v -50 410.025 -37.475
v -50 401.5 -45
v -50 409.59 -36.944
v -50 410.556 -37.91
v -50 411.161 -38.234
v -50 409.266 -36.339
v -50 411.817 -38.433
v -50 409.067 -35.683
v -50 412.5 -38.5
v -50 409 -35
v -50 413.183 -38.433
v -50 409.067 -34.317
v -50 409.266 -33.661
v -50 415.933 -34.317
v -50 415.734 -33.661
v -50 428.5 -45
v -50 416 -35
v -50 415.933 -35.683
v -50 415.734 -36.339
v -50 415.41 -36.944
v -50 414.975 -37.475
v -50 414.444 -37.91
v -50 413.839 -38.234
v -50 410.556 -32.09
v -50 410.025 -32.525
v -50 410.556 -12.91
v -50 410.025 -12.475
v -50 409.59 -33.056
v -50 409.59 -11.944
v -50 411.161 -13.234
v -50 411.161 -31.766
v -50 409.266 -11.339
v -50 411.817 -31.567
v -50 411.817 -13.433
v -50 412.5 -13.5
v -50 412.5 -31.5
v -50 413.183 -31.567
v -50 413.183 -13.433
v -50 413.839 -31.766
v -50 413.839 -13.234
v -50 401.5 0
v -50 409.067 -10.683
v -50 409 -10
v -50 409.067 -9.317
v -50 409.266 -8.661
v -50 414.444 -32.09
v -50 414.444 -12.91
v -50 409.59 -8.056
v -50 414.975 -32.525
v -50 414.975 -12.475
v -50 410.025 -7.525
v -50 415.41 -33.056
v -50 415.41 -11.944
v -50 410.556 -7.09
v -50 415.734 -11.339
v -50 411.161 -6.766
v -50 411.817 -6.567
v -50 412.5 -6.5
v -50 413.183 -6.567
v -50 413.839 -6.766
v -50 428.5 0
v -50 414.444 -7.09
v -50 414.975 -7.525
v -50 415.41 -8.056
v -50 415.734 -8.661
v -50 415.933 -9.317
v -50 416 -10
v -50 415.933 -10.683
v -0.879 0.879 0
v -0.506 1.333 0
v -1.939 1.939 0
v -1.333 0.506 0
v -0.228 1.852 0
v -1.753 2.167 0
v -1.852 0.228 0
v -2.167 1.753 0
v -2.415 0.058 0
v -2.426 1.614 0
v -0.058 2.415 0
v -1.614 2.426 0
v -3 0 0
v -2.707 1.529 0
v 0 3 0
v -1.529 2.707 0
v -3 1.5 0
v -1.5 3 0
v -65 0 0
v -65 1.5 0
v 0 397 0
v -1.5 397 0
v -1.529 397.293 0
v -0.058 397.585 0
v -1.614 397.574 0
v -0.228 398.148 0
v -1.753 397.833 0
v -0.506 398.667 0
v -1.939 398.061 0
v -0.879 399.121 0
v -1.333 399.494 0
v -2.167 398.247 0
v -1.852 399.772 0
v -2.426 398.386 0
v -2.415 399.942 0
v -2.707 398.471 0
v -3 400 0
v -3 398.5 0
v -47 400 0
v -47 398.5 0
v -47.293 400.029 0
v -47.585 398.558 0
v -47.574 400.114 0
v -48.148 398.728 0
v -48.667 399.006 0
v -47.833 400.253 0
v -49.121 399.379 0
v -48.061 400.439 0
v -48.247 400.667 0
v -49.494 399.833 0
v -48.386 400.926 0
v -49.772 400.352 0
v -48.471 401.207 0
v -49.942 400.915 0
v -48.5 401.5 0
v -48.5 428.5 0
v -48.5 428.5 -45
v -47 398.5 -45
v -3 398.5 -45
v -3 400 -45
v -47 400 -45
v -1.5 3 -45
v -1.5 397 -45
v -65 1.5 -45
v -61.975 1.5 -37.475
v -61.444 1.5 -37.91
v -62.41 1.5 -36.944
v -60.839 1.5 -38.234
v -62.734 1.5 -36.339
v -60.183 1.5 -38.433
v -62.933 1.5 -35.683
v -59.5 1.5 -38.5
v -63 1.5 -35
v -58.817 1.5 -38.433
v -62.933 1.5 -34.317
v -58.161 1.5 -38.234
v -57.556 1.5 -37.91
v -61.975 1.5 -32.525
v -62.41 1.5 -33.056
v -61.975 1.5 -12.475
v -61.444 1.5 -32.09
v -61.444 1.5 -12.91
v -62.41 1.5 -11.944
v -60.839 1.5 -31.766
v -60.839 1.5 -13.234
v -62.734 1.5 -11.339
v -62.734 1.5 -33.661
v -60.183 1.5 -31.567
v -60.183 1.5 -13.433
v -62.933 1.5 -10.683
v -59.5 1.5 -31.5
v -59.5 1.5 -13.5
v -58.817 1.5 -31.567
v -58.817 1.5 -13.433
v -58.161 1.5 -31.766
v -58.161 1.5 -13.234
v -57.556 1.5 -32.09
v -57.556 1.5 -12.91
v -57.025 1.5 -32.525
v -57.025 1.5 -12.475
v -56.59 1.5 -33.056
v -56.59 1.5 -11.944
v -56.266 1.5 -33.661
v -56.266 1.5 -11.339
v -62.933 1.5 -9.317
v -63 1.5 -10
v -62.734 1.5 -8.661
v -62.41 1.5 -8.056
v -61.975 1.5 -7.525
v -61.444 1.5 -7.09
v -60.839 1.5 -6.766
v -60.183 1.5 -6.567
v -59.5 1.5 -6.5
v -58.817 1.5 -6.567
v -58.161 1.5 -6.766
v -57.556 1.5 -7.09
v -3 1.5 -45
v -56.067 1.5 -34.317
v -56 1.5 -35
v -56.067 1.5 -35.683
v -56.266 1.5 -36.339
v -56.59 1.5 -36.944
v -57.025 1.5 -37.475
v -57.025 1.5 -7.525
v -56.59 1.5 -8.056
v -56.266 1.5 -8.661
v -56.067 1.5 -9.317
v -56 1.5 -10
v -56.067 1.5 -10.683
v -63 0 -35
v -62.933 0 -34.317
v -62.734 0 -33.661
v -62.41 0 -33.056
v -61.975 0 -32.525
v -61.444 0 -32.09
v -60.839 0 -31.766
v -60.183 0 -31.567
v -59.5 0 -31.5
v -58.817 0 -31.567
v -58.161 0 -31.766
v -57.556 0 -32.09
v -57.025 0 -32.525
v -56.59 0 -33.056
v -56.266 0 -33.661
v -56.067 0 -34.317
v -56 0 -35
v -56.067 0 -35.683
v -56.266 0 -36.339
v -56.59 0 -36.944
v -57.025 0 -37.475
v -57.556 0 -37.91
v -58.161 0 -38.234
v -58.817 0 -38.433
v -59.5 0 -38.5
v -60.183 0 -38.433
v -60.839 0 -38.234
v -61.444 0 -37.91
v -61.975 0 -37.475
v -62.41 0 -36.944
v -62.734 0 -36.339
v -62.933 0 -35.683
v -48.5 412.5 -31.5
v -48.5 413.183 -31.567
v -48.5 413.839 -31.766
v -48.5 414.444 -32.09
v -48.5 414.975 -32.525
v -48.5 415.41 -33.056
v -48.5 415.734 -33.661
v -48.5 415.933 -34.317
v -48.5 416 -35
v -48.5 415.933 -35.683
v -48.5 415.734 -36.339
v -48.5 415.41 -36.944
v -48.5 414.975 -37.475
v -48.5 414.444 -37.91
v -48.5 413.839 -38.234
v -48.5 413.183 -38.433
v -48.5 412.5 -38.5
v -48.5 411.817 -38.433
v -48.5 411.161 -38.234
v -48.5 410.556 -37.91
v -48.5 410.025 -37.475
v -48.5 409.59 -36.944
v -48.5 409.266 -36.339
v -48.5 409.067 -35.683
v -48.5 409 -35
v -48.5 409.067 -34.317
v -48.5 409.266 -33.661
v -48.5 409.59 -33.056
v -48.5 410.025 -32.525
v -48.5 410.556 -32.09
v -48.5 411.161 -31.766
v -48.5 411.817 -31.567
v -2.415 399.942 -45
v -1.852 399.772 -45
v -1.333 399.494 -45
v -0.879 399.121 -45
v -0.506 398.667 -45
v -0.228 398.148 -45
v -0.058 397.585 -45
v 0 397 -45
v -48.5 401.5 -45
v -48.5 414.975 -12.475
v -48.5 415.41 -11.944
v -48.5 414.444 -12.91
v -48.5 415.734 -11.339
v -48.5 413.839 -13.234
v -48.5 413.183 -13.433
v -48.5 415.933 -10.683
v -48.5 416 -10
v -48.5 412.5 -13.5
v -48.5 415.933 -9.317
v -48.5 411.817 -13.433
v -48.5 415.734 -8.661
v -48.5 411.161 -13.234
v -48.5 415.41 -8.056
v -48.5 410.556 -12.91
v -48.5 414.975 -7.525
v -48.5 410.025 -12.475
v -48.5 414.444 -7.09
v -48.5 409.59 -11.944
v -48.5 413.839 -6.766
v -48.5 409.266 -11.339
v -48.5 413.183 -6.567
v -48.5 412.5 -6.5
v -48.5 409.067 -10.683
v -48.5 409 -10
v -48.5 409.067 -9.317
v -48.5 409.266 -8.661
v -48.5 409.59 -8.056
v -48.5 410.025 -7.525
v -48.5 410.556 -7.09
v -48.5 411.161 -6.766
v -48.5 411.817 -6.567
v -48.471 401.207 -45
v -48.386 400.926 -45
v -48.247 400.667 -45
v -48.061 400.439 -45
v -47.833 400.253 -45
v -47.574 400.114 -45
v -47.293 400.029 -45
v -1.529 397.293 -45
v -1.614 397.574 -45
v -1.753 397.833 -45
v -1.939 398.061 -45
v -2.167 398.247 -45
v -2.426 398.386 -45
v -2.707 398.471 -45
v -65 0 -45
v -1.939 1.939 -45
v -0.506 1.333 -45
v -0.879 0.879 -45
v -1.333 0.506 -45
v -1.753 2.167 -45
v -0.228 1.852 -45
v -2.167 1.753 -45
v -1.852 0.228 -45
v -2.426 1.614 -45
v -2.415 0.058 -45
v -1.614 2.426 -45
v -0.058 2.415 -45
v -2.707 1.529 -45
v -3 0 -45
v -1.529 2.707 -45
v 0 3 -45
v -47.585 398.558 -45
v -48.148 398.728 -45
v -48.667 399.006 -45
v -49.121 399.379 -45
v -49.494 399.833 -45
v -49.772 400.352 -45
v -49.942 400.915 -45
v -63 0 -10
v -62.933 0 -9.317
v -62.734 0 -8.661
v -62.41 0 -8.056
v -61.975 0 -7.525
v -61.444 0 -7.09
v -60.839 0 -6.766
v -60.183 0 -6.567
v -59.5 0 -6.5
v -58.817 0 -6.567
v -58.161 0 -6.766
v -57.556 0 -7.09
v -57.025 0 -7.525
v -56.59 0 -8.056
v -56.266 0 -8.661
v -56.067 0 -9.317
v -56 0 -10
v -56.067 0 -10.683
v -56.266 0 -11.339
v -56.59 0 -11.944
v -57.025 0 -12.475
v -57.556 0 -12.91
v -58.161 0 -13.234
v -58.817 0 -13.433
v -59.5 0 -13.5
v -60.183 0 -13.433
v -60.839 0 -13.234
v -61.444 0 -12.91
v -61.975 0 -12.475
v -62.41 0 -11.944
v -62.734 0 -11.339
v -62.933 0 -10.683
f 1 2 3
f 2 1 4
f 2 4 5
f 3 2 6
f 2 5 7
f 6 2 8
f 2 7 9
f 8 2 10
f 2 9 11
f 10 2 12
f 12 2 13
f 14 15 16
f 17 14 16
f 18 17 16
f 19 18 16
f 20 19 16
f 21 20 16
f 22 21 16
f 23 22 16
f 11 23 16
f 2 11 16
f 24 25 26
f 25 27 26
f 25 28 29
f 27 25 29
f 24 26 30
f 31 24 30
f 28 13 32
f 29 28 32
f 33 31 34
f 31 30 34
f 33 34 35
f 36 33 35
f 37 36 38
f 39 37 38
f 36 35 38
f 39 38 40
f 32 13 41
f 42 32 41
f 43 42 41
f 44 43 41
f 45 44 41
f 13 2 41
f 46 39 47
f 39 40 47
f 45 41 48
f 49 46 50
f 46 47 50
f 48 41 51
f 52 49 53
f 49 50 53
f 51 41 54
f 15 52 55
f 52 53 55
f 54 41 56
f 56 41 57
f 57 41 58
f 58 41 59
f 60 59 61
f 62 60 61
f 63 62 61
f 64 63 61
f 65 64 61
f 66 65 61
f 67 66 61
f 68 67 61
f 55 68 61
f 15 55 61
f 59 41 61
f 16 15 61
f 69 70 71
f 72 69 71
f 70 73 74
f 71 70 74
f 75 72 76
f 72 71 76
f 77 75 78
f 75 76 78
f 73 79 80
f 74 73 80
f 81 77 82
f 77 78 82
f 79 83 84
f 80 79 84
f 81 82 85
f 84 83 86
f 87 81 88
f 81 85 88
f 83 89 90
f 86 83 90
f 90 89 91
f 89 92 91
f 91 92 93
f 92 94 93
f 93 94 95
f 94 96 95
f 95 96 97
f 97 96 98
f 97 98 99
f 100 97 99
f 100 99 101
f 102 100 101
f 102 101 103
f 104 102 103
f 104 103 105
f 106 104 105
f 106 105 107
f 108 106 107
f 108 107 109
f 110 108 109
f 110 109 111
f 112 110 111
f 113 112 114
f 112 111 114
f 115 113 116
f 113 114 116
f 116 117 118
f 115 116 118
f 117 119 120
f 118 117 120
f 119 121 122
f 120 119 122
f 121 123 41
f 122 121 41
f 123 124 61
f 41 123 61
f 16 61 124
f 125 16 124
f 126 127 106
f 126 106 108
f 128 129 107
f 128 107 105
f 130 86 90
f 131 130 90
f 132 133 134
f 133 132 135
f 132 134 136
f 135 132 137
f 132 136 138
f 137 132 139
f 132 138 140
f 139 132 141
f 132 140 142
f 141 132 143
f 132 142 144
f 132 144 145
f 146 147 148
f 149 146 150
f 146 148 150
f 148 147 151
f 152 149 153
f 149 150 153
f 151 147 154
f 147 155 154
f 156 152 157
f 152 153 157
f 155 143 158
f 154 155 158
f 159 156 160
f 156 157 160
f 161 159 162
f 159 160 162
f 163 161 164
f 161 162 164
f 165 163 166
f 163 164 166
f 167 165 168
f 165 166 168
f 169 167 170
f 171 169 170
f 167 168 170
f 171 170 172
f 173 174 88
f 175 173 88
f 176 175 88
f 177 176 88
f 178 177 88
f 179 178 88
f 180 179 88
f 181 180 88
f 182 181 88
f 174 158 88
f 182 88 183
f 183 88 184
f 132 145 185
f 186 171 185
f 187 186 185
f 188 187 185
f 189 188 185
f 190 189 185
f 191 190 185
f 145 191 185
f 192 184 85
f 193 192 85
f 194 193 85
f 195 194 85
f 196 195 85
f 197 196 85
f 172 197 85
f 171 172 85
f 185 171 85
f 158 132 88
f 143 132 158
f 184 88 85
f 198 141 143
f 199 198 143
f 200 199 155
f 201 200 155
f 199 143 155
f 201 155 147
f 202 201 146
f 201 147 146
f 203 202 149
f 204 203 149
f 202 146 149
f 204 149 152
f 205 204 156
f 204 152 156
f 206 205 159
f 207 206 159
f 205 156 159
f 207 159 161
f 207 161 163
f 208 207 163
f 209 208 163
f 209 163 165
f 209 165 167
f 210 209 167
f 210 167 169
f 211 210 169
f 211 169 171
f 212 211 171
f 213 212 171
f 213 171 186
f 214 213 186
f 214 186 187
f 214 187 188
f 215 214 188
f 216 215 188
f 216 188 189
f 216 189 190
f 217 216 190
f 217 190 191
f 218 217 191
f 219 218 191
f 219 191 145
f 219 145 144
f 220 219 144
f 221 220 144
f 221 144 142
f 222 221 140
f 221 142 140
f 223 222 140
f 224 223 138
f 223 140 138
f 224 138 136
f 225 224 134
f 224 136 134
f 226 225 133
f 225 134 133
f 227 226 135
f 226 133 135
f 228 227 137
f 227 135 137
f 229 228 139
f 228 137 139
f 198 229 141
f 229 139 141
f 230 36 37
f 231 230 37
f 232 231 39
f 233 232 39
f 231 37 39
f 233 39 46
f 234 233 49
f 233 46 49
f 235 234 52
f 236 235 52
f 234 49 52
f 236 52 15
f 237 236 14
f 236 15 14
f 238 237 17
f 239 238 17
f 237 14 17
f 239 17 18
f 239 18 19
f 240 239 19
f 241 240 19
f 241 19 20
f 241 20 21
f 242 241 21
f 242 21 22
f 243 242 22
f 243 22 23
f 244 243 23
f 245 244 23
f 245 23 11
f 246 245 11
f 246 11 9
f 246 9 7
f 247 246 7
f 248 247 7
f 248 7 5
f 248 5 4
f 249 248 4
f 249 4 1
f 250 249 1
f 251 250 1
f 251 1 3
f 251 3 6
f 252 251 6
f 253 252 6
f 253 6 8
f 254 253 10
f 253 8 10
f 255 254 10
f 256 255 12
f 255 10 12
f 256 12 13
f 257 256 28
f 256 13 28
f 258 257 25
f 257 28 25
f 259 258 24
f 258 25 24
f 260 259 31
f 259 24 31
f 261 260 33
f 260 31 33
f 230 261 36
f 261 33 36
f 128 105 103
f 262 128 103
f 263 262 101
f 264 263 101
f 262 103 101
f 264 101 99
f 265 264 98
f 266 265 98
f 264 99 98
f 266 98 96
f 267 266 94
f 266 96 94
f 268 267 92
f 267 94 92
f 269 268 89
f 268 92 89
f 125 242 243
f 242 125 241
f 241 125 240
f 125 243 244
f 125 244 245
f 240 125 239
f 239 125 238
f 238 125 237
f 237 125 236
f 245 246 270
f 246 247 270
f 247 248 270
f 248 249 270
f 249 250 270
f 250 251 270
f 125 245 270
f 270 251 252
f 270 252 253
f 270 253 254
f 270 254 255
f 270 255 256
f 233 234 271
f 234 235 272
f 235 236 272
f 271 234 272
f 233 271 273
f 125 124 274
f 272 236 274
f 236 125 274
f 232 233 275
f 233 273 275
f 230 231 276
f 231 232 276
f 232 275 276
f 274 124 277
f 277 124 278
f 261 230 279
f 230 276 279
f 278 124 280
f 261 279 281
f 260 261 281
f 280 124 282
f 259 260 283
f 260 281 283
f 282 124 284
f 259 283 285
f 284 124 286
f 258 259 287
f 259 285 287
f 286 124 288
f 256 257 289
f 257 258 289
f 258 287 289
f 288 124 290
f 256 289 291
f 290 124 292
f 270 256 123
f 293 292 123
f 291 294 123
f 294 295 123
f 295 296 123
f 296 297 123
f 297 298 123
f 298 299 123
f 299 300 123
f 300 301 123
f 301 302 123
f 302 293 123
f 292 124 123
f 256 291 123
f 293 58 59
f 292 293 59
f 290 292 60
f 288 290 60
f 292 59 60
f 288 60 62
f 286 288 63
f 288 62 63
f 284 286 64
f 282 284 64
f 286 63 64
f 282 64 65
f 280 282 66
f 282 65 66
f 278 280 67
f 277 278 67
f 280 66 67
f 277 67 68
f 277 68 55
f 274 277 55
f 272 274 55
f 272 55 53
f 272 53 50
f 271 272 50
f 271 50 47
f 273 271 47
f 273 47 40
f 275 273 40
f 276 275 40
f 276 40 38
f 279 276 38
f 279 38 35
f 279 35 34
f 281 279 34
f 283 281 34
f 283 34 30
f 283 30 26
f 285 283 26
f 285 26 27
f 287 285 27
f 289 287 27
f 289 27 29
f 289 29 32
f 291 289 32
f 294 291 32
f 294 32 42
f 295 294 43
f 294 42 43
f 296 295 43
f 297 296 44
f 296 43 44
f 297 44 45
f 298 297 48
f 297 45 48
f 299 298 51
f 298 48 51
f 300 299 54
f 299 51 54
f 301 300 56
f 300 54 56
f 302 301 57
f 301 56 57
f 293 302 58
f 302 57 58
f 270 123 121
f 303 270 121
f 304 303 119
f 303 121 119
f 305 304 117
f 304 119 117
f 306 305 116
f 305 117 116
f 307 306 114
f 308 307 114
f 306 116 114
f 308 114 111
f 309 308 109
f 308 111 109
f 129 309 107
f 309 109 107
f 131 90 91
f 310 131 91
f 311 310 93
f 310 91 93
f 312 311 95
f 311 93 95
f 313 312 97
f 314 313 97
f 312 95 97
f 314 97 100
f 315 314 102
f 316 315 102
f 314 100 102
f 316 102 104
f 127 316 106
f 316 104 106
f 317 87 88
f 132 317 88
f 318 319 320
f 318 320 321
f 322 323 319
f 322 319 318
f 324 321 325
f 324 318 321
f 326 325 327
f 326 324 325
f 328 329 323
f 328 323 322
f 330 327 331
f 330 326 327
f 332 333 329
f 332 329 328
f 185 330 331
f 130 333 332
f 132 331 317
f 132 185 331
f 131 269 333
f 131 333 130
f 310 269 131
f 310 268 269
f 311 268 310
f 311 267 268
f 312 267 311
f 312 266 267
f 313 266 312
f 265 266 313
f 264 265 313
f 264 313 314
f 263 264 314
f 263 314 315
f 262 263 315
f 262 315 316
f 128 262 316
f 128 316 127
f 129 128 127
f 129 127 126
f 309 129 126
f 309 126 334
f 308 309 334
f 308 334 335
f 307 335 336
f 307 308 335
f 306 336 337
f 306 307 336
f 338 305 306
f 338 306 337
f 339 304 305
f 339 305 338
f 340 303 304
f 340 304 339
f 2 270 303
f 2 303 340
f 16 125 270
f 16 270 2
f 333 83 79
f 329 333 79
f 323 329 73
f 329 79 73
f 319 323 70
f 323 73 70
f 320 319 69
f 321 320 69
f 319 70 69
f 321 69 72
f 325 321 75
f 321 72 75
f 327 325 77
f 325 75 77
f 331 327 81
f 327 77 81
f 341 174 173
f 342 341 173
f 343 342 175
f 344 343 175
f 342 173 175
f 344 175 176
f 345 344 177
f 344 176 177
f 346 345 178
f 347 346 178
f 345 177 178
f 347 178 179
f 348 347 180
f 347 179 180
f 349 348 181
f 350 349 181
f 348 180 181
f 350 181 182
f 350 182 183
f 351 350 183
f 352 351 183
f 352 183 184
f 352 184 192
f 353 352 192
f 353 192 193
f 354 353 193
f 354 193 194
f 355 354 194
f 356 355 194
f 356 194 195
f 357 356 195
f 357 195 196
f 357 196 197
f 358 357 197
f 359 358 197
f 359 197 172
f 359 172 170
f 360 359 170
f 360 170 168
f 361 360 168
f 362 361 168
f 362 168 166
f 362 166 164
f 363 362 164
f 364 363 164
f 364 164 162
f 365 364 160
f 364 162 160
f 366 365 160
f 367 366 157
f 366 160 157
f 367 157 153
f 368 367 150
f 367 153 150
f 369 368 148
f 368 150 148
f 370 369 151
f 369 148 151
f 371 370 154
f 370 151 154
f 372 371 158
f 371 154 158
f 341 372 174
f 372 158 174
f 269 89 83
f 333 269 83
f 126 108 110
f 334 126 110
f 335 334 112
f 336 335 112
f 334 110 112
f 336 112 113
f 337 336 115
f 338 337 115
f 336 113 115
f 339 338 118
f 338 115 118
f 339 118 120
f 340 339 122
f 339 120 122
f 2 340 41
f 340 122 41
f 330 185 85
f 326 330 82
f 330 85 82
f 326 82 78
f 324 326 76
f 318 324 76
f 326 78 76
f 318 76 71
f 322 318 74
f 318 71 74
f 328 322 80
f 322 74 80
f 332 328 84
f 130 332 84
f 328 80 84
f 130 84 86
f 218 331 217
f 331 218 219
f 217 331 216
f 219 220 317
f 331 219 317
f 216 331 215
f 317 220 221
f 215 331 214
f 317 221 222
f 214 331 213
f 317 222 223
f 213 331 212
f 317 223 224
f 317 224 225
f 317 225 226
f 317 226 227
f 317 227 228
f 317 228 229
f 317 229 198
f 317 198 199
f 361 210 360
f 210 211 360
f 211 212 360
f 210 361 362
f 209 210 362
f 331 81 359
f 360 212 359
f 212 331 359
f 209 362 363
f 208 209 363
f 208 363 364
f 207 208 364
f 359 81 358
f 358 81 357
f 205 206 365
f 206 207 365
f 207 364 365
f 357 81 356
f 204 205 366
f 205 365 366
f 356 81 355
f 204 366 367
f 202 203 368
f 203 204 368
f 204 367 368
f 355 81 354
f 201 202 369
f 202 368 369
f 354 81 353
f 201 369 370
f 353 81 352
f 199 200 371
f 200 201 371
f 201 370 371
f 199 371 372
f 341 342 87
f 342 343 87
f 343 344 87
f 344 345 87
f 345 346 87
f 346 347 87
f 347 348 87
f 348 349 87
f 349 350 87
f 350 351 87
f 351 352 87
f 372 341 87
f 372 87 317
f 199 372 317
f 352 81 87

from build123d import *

# Parameters (mm, degrees)
SM_BASE_FLANGE_1_DEPTH = 45
SKETCH_6_R             = 3.5
CUT_EXTRUDE_1_DEPTH    = 10
SKETCH_7_R             = 3.5
CUT_EXTRUDE_2_DEPTH    = 10


# Sheet-metal steps are written as plain solids
with BuildPart() as part:
    # Sketch 1 → Базовая кромка1 (new body)
    with BuildSketch(Plane.XY):
        with BuildLine():
            Line((-48.5, 428.5), (-48.5, 401.5))
            ThreePointArc((-48.5, 401.5), (-48.060660172, 400.439339828), (-47, 400))
            Line((-47, 400), (-3, 400))
            ThreePointArc((-3, 400), (-0.878679656, 399.121320344), (0, 397))
            Line((0, 397), (0, 3))
            ThreePointArc((0, 3), (-0.878679656, 0.878679656), (-3, 0))
            Line((-3, 0), (-65, 0))
            Line((-65, 0), (-65, 1.5))
            Line((-65, 1.5), (-3, 1.5))
            ThreePointArc((-3, 1.5), (-1.939339828, 1.939339828), (-1.5, 3))
            Line((-1.5, 3), (-1.5, 397))
            ThreePointArc((-1.5, 397), (-1.939339828, 398.060660172), (-3, 398.5))
            Line((-3, 398.5), (-47, 398.5))
            ThreePointArc((-47, 398.5), (-49.121320344, 399.378679656), (-50, 401.5))
            Line((-50, 401.5), (-50, 428.5))
            Line((-50, 428.5), (-48.5, 428.5))
        make_face()
    extrude(amount=-SM_BASE_FLANGE_1_DEPTH)

    # Эскиз6 → Вырез-Вытянуть1 (cut)
    with BuildSketch(Plane(origin=(0, 1.5, 0), x_dir=(1, 0, 0), z_dir=(0, 1, 0))):
        with Locations(Location((-59.5, 35, 0), (0, 0, 180))):
            Circle(SKETCH_6_R)
        with Locations(Location((-59.5, 10, 0), (0, 0, 180))):
            Circle(SKETCH_6_R)
    extrude(amount=-CUT_EXTRUDE_1_DEPTH, mode=Mode.SUBTRACT)

    # Эскиз7 → Вырез-Вытянуть2 (cut)
    with BuildSketch(Plane.ZY.offset(50)):
        with Locations((-35, 412.5)):
            Circle(SKETCH_7_R)
        with Locations((-10, 412.5)):
            Circle(SKETCH_7_R)
    extrude(amount=-CUT_EXTRUDE_2_DEPTH, mode=Mode.SUBTRACT)


solid = part.part
